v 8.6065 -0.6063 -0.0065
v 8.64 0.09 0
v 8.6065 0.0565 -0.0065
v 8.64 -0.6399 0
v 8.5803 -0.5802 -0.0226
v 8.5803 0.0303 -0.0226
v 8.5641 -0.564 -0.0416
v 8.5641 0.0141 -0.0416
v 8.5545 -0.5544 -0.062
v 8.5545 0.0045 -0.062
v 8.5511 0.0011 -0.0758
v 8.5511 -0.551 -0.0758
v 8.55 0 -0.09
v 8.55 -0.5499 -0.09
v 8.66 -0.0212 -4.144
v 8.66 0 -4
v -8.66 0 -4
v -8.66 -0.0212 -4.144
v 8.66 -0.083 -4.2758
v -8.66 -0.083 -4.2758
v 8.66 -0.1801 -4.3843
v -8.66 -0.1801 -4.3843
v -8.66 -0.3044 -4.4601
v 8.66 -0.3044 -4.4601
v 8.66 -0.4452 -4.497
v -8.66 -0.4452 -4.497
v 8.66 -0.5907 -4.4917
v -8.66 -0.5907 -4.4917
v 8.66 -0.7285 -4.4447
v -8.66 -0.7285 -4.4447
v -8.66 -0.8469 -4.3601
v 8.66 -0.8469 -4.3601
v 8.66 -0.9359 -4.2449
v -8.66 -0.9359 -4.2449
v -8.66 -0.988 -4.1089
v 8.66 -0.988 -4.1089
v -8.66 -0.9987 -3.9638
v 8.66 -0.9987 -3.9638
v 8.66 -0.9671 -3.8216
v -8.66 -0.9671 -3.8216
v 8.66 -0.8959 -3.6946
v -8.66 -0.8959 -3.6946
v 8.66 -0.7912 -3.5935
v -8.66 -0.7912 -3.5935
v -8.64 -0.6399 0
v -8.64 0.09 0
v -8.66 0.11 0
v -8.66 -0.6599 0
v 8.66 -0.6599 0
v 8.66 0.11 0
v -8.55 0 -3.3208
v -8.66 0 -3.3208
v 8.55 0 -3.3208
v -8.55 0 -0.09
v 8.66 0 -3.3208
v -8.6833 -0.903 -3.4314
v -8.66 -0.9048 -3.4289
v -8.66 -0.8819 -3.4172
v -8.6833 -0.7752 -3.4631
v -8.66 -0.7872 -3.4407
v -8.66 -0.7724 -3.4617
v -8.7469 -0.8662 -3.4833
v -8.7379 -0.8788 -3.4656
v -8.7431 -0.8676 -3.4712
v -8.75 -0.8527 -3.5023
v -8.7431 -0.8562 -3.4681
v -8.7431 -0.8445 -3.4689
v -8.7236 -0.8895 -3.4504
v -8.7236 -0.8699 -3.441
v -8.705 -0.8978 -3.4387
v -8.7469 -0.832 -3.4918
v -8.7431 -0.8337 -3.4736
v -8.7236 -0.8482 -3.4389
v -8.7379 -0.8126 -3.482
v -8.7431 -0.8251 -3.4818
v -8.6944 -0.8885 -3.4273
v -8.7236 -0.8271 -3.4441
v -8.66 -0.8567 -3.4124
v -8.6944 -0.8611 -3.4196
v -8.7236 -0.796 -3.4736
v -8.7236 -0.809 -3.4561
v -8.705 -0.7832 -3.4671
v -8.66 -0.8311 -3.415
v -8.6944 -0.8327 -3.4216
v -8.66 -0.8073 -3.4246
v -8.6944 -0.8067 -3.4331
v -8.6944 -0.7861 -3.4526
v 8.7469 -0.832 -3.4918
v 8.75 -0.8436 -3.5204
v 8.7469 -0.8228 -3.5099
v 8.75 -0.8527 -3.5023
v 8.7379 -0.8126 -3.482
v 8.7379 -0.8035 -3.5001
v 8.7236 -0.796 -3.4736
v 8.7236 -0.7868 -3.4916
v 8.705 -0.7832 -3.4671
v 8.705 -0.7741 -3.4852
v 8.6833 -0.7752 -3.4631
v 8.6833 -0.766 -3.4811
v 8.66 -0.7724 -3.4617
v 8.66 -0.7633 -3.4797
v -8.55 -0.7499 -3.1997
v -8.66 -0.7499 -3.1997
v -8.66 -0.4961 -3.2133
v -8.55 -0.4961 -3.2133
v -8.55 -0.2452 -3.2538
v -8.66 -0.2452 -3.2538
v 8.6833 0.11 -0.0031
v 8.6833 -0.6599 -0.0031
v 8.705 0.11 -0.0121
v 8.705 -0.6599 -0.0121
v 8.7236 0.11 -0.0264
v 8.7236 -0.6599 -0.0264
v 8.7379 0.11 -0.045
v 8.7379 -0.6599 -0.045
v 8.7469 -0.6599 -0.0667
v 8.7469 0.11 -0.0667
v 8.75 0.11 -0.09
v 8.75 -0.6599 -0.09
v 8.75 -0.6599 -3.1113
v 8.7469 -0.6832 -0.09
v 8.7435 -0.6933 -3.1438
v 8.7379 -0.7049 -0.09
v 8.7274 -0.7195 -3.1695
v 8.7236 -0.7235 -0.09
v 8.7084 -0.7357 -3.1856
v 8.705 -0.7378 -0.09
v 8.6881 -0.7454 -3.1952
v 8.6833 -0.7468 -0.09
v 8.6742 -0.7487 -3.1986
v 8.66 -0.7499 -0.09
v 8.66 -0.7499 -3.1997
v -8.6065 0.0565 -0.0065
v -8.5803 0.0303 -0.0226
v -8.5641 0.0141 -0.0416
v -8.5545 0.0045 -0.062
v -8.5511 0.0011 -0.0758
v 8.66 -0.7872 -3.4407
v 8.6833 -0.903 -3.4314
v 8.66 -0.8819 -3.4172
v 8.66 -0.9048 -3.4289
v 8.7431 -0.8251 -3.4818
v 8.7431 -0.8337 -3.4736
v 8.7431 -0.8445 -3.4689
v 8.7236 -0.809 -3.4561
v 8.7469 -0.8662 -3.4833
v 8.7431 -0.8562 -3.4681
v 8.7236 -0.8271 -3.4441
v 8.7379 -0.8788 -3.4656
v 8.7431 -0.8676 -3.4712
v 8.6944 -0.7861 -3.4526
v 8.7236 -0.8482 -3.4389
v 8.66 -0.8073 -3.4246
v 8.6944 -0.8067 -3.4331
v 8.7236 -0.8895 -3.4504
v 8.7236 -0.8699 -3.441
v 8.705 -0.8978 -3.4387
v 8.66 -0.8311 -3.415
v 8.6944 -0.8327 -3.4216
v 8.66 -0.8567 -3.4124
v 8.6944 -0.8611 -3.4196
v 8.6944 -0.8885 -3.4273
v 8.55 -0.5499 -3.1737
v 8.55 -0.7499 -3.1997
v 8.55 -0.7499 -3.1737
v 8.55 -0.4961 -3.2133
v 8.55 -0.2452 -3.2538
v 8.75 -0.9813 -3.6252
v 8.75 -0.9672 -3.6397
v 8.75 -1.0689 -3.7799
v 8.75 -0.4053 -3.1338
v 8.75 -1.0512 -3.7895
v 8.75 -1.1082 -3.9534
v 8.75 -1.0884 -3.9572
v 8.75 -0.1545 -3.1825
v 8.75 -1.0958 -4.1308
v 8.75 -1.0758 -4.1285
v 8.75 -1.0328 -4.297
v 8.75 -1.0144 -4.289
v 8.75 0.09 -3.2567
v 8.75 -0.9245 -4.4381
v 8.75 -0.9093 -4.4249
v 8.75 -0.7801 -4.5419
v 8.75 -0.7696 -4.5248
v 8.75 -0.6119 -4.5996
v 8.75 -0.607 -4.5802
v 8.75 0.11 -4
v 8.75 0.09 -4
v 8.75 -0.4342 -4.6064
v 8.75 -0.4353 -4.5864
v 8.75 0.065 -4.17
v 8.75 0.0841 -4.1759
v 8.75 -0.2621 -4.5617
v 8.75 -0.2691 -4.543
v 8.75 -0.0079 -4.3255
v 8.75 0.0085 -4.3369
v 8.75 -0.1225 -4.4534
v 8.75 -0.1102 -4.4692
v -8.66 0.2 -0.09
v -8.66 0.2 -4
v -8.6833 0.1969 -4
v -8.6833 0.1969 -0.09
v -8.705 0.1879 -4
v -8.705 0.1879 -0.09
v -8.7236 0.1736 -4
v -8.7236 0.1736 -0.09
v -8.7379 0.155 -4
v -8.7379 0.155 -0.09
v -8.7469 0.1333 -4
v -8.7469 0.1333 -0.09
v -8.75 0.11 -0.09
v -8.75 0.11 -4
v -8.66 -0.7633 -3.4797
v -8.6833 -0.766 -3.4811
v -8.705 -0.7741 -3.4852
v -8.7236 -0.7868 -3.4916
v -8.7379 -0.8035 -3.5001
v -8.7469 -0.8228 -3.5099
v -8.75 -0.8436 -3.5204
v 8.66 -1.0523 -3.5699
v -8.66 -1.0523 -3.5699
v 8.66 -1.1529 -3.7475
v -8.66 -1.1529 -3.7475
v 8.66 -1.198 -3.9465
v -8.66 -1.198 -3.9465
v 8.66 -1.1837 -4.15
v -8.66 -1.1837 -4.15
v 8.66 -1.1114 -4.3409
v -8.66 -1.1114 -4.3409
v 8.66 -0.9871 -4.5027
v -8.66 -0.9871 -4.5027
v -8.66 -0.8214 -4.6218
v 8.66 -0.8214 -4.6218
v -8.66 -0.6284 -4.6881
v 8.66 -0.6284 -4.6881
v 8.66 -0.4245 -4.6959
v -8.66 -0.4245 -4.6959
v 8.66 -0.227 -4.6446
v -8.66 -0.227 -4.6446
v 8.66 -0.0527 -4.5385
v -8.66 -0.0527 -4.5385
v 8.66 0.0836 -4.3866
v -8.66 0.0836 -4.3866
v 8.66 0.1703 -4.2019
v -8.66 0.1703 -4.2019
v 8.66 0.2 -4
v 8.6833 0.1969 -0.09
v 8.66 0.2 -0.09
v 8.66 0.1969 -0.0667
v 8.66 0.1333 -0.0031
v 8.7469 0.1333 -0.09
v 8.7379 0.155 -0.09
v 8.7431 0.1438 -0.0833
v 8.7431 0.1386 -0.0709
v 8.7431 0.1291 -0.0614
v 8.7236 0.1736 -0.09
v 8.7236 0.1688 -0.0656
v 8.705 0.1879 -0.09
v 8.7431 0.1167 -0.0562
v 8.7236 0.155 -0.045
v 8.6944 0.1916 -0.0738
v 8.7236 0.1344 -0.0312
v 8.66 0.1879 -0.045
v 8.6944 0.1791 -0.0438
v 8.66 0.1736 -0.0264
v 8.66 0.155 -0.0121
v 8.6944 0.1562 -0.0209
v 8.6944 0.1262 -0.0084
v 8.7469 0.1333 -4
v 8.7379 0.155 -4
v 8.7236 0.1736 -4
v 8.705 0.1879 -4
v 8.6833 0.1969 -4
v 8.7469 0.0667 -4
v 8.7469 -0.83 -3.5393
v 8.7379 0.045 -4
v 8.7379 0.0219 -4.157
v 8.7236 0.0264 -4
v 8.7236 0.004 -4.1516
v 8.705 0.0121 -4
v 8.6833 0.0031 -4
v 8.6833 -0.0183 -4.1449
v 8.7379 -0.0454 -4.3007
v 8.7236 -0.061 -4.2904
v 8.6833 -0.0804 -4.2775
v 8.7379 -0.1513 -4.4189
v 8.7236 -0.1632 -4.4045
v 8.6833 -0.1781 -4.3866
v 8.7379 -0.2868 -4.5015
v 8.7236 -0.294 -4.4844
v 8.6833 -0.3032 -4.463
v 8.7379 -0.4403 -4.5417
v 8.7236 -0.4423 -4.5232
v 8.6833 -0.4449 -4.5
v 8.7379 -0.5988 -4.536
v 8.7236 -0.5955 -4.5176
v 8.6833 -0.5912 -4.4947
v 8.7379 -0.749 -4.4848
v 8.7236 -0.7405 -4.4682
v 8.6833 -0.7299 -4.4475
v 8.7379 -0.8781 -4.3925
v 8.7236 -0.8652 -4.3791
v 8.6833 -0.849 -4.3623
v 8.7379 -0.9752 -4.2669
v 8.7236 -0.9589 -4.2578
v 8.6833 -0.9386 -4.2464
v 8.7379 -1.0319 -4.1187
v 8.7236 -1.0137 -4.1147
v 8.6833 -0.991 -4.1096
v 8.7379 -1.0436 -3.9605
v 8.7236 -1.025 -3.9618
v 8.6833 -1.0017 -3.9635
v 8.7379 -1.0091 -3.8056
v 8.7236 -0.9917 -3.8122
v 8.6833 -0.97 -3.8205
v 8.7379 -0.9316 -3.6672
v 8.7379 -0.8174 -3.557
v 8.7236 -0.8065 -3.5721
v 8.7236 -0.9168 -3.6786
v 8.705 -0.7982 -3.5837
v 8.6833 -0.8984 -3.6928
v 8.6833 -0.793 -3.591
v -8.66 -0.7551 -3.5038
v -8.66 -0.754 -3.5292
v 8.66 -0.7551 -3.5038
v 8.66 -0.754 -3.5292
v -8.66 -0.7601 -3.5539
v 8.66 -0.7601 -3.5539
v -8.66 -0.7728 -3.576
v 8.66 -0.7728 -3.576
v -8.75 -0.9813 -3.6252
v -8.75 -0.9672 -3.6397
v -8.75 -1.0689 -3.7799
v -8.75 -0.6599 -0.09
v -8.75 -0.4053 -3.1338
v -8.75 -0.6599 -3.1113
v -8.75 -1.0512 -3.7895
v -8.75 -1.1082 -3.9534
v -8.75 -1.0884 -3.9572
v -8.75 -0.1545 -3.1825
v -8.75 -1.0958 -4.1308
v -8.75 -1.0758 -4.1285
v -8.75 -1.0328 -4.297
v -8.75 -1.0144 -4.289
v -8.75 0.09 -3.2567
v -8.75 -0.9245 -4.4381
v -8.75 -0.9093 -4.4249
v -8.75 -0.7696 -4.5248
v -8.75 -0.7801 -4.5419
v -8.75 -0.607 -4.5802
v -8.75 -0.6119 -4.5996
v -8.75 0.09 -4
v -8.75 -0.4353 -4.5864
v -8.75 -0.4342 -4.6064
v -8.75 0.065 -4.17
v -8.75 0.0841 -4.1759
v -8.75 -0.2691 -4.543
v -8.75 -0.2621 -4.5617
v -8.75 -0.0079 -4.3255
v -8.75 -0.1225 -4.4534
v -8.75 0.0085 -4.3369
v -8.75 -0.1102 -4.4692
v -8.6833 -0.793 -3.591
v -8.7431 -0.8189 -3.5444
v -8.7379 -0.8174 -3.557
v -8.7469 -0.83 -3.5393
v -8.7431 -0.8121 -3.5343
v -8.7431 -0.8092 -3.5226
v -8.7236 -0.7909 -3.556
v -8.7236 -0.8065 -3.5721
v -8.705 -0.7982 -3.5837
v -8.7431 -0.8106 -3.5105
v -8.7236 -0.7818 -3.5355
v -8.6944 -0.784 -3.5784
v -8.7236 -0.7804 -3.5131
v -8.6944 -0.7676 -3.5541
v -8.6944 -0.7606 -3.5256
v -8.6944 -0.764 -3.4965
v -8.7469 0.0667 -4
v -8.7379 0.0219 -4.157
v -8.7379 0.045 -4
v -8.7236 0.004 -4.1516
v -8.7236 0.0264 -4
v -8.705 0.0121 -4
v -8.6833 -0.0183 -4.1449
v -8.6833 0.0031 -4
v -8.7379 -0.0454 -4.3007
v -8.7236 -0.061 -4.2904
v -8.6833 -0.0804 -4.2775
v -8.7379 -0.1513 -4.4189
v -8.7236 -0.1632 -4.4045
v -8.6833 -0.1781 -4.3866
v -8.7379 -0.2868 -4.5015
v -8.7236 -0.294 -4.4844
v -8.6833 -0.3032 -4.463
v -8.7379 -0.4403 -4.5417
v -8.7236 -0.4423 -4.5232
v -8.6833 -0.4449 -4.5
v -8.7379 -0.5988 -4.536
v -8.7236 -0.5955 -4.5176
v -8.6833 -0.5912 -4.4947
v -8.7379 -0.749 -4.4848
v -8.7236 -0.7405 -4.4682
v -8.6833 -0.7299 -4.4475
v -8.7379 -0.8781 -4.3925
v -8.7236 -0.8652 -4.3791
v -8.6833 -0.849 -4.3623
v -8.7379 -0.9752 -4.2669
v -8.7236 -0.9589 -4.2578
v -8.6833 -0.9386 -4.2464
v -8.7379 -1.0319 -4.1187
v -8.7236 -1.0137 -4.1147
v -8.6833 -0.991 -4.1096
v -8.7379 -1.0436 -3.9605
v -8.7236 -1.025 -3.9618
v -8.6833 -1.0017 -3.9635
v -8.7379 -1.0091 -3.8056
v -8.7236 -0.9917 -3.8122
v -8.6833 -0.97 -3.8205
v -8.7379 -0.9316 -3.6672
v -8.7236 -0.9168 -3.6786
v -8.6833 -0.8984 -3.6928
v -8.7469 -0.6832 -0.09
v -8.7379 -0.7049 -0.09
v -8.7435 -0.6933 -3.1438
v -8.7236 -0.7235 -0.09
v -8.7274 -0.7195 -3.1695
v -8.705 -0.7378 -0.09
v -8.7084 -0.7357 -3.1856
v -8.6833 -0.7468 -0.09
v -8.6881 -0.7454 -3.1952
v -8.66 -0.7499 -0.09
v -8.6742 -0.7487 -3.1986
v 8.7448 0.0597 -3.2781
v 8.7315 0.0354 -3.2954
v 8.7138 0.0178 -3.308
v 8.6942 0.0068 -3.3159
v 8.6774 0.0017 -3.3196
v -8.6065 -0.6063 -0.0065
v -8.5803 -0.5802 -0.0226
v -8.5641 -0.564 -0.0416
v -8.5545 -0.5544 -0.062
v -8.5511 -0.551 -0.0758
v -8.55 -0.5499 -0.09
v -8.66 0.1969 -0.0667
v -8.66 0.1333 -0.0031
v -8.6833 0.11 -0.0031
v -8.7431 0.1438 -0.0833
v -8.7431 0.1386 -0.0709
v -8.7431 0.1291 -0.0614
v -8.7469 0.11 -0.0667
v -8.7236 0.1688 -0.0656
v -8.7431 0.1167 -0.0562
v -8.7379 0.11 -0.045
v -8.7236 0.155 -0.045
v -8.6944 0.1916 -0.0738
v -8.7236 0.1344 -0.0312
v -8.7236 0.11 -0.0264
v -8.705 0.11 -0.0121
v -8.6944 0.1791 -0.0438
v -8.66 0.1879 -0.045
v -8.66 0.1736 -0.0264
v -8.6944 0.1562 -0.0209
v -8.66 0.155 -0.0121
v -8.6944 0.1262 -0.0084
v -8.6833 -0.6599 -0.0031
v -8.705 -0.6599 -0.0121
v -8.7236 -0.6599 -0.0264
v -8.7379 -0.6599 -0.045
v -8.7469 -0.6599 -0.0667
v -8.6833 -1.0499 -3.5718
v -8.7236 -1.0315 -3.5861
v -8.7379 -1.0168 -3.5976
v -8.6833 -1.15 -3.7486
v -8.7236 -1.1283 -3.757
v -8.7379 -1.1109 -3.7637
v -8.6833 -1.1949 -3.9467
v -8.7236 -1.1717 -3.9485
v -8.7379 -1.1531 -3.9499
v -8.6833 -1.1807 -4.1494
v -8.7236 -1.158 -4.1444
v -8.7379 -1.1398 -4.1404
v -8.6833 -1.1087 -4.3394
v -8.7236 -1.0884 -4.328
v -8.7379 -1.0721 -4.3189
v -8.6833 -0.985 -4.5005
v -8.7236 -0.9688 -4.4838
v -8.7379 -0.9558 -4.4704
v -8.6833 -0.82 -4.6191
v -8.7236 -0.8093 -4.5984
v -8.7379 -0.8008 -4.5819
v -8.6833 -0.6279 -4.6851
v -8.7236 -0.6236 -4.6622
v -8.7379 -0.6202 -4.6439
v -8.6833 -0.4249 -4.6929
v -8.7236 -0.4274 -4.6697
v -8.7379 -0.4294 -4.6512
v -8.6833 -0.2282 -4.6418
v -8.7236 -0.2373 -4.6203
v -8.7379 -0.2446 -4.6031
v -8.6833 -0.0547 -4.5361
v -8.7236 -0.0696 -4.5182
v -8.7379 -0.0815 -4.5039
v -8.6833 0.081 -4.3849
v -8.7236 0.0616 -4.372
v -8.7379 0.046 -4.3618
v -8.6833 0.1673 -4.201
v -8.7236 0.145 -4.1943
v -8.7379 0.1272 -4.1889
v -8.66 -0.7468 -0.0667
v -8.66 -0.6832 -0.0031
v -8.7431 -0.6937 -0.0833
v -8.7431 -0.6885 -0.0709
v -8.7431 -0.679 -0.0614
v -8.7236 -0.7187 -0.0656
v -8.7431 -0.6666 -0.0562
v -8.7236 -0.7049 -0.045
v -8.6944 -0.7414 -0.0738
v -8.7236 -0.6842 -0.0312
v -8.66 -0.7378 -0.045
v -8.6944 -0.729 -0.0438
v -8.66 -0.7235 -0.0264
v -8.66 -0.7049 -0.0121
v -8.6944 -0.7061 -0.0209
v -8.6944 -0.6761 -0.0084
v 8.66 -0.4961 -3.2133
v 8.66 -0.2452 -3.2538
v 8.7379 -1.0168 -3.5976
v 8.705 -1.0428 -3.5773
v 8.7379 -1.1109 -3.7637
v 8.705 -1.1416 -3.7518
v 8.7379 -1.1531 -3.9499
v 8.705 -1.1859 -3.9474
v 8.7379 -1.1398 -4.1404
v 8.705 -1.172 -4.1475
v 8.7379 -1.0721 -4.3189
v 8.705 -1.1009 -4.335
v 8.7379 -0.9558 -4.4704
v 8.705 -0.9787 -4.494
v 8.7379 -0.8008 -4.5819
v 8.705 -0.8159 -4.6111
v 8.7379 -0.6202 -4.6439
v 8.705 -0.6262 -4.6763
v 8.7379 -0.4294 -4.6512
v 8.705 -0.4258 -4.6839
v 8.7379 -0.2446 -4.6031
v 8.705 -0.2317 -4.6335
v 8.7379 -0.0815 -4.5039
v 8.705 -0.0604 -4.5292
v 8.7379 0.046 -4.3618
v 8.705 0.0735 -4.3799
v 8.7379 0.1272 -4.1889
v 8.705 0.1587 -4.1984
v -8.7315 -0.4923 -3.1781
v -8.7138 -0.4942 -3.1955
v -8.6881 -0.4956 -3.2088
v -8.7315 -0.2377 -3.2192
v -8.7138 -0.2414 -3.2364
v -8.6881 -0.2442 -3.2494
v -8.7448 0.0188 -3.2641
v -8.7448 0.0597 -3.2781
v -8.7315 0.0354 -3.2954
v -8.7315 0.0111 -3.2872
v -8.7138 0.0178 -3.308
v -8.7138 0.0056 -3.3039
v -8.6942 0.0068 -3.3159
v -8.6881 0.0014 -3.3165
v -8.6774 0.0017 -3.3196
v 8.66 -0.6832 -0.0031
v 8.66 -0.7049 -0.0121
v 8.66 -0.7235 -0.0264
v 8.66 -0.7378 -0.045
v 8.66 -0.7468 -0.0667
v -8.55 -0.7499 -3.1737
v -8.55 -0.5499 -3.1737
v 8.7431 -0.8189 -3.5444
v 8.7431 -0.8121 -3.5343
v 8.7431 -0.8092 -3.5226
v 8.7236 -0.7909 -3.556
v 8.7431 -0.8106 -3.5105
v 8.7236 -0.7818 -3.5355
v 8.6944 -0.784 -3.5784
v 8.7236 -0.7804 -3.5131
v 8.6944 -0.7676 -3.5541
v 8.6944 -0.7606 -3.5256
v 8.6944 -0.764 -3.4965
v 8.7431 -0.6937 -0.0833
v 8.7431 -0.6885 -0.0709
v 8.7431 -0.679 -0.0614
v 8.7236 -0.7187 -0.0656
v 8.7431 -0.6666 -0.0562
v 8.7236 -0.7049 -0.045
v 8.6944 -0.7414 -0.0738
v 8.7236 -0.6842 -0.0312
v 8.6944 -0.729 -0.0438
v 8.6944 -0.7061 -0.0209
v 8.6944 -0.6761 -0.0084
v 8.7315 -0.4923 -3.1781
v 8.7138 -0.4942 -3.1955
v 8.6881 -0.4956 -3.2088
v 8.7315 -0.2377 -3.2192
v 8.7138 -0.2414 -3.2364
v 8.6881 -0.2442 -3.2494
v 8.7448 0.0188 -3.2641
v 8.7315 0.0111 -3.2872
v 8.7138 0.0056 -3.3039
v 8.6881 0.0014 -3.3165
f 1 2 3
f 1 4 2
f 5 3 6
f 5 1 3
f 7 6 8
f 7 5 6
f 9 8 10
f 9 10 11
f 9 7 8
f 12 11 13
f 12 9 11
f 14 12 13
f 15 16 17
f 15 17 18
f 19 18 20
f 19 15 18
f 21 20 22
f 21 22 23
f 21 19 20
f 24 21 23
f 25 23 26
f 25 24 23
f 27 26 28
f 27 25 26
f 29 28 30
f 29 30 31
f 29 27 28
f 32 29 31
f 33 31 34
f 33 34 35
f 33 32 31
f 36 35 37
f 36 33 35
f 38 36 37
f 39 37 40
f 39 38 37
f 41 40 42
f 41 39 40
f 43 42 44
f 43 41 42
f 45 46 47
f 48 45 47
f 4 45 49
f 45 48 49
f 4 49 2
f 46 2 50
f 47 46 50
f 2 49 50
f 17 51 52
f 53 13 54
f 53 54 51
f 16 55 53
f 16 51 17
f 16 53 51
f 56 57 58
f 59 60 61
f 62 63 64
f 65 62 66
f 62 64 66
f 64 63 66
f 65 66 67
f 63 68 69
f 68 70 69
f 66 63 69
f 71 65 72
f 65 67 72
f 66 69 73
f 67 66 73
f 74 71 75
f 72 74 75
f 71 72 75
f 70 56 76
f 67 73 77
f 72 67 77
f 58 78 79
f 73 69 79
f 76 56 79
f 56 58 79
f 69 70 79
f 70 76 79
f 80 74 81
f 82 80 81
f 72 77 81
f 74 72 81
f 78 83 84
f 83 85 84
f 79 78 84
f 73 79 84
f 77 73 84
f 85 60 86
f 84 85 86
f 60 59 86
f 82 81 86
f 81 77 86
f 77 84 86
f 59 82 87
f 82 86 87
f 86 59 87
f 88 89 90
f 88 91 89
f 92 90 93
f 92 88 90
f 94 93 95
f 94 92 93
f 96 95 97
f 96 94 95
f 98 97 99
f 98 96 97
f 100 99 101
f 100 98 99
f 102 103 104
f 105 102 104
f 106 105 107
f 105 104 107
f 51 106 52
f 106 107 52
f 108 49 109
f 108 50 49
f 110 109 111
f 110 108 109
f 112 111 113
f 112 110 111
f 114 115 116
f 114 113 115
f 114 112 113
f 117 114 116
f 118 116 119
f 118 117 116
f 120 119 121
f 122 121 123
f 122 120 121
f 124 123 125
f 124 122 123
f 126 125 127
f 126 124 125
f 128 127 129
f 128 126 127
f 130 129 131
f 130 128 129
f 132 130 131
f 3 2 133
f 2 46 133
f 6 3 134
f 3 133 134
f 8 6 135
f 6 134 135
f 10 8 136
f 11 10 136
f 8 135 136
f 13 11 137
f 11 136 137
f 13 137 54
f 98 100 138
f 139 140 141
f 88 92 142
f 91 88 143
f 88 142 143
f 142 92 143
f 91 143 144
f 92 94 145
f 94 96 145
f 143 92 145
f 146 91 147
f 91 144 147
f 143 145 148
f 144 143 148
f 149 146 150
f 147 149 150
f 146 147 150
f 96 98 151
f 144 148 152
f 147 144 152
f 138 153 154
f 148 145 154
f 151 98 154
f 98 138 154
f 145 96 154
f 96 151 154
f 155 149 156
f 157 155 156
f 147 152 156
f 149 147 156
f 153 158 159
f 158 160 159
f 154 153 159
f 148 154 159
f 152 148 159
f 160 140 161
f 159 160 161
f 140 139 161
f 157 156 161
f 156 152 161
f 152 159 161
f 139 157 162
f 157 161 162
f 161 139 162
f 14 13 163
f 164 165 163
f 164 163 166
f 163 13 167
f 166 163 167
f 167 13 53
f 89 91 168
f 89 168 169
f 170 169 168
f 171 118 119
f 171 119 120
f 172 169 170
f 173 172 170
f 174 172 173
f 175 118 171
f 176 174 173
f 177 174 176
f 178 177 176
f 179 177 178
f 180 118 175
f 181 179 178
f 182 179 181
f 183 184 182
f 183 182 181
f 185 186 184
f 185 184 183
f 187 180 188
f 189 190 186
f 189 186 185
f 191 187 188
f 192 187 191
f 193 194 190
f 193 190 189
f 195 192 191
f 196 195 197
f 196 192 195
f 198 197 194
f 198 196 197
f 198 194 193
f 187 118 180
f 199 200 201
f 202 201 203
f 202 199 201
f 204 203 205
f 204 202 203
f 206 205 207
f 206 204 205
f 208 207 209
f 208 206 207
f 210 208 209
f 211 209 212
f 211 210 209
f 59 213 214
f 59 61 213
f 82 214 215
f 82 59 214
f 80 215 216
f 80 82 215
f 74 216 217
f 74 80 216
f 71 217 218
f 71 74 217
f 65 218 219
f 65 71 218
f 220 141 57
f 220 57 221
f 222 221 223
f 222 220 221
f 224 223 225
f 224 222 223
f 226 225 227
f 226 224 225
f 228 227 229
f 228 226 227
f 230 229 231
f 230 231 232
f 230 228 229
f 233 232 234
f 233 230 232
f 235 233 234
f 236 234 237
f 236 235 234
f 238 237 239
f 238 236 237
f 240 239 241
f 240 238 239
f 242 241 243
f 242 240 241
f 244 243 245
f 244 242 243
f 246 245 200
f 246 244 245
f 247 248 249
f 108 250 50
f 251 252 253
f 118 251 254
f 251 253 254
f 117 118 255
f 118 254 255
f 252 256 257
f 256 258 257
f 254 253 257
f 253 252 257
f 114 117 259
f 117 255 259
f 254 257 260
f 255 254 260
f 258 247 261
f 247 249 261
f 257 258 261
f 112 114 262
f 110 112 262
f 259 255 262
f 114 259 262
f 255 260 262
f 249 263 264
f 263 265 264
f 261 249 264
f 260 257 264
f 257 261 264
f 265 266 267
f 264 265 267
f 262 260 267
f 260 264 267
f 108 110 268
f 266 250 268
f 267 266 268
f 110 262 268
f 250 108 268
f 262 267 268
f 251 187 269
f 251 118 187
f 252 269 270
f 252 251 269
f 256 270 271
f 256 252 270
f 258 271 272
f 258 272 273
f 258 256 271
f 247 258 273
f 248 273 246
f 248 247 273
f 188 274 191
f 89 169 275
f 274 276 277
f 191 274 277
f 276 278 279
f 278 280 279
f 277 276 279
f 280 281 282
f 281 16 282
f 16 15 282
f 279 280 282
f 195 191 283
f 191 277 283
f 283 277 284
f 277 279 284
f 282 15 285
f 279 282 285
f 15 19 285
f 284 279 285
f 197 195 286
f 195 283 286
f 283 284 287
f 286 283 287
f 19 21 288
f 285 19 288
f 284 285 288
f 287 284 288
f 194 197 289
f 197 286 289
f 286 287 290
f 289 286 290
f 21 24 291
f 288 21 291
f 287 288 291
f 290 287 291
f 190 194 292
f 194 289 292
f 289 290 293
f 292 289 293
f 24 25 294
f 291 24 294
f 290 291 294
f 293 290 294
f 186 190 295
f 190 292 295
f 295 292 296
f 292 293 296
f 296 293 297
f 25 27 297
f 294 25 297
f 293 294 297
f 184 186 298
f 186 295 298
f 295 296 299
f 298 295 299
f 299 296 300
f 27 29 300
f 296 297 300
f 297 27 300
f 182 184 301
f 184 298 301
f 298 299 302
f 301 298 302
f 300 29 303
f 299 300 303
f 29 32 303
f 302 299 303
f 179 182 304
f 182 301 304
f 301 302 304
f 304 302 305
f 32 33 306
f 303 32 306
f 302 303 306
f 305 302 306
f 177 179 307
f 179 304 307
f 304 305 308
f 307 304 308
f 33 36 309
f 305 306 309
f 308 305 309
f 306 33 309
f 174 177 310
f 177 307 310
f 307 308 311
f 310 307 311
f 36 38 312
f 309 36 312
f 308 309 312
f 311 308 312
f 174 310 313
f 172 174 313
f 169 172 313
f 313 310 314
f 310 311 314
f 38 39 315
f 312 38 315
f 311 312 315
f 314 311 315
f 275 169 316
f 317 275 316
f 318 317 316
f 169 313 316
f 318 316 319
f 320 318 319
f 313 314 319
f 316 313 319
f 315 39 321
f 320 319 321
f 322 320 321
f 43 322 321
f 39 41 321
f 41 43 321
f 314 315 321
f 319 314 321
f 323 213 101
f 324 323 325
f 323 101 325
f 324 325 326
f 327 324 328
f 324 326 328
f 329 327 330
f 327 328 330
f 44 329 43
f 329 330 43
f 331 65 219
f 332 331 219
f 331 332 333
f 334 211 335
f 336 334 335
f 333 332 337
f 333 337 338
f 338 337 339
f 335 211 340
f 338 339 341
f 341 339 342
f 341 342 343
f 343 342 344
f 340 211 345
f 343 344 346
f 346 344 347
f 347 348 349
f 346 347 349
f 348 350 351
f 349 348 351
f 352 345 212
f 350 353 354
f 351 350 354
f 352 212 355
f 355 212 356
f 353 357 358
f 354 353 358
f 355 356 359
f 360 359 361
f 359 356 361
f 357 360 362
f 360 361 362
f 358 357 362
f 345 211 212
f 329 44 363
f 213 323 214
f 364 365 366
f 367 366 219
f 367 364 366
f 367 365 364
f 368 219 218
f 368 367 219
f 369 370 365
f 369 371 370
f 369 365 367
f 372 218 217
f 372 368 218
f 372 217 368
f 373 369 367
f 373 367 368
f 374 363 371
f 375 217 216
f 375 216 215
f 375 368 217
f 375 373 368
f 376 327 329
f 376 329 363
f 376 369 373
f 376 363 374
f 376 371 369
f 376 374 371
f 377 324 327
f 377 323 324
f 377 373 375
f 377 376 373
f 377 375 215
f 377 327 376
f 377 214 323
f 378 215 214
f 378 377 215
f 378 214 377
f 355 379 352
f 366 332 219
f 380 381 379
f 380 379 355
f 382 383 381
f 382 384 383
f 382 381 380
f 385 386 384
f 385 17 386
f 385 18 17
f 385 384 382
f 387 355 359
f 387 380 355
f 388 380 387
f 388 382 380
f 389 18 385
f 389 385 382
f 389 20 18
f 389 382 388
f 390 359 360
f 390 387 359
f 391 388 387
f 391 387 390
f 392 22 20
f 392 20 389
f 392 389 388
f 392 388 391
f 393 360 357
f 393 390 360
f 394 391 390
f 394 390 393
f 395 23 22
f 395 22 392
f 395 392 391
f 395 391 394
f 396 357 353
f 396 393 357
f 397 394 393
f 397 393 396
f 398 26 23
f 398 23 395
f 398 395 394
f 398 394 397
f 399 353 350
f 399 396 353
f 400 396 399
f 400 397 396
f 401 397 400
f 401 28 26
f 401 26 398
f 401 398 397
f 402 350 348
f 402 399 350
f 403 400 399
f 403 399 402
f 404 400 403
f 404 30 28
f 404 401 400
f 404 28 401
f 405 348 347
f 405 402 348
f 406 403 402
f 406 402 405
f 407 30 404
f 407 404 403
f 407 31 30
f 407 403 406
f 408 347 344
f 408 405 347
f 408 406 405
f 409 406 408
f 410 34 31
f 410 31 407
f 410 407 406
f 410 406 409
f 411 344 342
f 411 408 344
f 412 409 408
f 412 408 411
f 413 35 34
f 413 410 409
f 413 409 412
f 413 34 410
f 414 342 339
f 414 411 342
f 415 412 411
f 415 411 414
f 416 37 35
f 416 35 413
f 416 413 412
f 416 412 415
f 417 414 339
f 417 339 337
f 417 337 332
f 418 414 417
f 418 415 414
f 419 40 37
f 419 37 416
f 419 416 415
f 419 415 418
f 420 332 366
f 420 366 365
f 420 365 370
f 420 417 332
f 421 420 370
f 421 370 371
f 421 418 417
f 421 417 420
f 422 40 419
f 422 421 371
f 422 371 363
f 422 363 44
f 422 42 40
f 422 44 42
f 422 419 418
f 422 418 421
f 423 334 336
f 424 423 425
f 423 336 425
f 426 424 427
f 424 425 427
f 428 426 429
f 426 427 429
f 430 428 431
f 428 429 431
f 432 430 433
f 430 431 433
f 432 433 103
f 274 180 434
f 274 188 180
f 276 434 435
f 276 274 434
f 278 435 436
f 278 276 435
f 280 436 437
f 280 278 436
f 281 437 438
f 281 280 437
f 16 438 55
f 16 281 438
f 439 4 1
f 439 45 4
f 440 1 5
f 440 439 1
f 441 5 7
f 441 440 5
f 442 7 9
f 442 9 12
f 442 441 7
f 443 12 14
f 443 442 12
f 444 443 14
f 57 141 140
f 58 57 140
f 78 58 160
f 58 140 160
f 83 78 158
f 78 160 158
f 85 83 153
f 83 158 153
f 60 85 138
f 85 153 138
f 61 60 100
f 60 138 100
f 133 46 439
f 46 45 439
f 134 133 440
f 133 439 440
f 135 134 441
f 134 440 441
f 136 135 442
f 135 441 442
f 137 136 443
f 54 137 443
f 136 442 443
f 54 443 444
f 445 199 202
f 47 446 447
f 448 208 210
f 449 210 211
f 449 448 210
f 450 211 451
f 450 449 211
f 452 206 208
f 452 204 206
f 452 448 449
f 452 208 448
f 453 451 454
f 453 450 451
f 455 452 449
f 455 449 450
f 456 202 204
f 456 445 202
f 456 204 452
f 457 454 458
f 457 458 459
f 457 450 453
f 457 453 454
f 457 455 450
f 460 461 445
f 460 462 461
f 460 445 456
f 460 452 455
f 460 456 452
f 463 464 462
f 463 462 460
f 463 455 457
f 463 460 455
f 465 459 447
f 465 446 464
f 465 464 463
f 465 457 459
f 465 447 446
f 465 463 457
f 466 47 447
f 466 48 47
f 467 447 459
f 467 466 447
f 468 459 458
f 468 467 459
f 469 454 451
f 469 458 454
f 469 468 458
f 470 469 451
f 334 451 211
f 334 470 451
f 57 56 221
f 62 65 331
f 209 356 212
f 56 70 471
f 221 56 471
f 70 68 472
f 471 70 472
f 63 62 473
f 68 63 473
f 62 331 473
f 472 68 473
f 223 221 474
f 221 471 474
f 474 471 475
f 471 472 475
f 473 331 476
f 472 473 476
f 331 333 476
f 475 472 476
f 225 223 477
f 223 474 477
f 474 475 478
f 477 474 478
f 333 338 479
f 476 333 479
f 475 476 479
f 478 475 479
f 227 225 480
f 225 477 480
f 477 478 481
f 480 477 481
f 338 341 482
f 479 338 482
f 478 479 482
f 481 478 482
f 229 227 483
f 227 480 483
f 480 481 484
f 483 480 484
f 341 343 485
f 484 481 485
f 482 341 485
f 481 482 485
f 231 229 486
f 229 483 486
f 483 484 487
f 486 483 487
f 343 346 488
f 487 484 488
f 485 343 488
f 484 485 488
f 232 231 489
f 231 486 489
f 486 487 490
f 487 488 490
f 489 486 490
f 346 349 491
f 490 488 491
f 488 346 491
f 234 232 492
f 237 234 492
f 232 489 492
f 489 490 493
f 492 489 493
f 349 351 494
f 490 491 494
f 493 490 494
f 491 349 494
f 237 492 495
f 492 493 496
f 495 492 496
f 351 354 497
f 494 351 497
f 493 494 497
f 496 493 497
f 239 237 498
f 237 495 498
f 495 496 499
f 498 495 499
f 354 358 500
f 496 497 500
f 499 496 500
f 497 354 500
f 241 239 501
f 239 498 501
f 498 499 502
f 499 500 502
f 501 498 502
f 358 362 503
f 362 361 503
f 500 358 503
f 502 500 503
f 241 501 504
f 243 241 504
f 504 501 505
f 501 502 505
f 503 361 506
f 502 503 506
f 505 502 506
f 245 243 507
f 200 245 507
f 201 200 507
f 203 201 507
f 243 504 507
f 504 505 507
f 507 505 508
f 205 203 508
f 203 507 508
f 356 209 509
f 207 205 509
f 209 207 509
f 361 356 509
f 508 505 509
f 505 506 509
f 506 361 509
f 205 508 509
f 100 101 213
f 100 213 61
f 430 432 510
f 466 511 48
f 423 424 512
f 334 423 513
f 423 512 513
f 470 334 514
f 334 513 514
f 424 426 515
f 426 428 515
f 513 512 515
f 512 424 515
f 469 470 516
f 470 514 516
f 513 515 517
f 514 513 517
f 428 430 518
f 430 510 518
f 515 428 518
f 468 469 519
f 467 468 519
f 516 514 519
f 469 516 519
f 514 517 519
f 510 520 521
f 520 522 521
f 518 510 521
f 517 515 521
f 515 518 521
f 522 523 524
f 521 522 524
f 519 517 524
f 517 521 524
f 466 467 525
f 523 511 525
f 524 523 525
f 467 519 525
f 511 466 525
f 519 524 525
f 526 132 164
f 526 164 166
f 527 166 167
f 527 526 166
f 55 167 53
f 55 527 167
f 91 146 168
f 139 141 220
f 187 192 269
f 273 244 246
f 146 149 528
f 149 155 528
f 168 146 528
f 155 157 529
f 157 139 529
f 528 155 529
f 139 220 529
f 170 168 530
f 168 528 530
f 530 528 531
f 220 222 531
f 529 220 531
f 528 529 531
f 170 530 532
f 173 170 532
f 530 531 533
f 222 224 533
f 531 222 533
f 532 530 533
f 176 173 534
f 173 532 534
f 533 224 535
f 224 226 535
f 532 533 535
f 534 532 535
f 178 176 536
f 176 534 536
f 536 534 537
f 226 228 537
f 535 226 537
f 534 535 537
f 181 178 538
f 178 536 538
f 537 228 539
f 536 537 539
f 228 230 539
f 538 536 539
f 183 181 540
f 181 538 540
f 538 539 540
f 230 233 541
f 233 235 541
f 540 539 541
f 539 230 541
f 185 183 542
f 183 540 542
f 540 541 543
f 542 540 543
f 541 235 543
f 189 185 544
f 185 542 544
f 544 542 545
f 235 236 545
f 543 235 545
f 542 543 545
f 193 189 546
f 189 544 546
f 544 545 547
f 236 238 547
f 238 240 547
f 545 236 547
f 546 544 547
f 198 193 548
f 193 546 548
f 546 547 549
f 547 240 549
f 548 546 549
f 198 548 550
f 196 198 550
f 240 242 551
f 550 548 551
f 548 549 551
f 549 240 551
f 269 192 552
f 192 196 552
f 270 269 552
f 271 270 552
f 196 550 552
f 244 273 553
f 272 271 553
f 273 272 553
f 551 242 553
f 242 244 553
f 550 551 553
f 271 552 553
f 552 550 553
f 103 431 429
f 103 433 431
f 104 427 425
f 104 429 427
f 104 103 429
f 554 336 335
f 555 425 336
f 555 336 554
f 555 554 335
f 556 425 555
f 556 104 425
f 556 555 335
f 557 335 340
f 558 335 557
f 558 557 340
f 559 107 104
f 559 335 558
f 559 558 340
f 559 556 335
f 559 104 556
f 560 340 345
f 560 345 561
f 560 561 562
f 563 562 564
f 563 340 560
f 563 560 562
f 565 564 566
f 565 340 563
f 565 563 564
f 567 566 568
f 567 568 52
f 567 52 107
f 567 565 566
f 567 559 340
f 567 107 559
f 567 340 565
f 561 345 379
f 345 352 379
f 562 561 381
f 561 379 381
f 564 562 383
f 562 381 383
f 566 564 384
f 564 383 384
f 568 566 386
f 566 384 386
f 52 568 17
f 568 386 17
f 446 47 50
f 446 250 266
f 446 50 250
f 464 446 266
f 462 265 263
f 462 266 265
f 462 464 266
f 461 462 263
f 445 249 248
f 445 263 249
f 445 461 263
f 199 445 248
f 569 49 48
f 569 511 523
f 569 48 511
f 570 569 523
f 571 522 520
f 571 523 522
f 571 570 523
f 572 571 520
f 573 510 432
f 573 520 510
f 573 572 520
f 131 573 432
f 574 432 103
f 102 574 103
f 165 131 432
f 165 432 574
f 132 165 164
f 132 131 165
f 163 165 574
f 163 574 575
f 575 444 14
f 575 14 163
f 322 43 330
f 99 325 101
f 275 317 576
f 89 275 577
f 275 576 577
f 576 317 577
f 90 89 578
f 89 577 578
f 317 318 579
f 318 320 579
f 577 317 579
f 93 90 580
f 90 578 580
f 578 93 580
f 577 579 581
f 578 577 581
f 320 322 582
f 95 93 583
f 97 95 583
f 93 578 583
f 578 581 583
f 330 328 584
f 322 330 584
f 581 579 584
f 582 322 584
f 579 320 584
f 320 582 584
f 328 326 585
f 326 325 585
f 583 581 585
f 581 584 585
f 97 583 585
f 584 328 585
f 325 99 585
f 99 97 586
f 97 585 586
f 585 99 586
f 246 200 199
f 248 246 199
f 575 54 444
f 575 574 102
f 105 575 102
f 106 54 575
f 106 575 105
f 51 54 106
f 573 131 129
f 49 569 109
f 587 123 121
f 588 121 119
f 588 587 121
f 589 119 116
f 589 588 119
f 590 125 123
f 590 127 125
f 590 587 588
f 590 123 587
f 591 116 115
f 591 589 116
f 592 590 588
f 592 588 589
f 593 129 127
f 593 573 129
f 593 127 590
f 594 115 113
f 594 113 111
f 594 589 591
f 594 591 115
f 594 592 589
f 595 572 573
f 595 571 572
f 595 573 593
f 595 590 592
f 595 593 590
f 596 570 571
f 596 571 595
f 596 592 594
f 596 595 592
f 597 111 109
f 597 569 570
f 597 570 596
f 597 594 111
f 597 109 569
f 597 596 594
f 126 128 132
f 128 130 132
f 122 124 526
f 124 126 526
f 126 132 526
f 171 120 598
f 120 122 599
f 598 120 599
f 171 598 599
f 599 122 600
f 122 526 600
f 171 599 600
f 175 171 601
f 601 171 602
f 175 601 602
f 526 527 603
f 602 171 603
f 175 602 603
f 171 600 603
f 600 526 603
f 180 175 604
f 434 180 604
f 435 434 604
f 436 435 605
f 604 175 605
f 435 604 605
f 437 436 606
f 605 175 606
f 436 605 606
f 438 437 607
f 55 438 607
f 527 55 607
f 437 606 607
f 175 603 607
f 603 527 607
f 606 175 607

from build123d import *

# Parameters (mm, degrees)
BOSS_EXTRUDE1_DEPTH             = 8.75
BOSS_EXTRUDE2_DEPTH             = 0.2
BOSS_EXTRUDE3_REACH             = 12.005
SKETCH4_W                       = 3.173679441
SKETCH4_H                       = 0.2
BOSS_EXTRUDE3_DIRECTION_2_REACH = 12.005
FILLET1_R                       = 0.09


with BuildPart() as part:
    # Sketch2 → Boss-Extrude1 (new, symmetric)
    with BuildSketch(Plane(origin=(0, 0, 0), x_dir=(0, 0, -1), z_dir=(1, 0, 0))):
        with BuildLine():
            Line((0, 0), (4, 0))
            ThreePointArc((4, 0), (4.425963639, -0.761830056), (3.553879666, -0.725780087))
            Line((3.553879666, -0.725780087), (3.375431533, -0.816092122))
            ThreePointArc((3.375431533, -0.816092122), (4.596349095, -0.866562078), (4, 0.2))
            Line((4, 0.2), (0, 0.2))
            Line((0, 0.2), (0, 0))
        make_face()
    extrude(amount=BOSS_EXTRUDE1_DEPTH, both=True)

    # Sketch3 → Boss-Extrude2 (add)
    with BuildSketch(Plane(origin=(8.75, 0, 0), x_dir=(0, 0, -1), z_dir=(1, 0, 0))):
        with BuildLine():
            Line((0, 0), (0, -0.749873542))
            Line((0, -0.749873542), (3.199706895, -0.749873542))
            ThreePointArc((3.199706895, -0.749873542), (3.230171613, -0.370080622), (3.320786706, 0))
            Line((3.320786706, 0), (0, 0))
        make_face()
    boss_extrude2 = extrude(amount=-BOSS_EXTRUDE2_DEPTH)

    # Mirror1: Boss-Extrude2 across plane
    add(boss_extrude2.mirror(Plane(origin=(0, 0, 0), x_dir=(0, 0, 1), z_dir=(1, 0, 0))))

    # Boss-Extrude3: up to this face of the body (flat: up to its plane)
    boss_extrude3_end = Plane(part.part.faces().sort_by_distance((8.55, -0.372613624, -1.620023342))[0])
    # Sketch4 → Boss-Extrude3 (add, up to the picked face)
    with BuildSketch(Plane(origin=(0, 0, 0), x_dir=(0, 0, -1), z_dir=(1, 0, 0)), mode=Mode.PRIVATE) as boss_extrude3_sk1:
        with Locations((1.58683972, -0.649873542)):
            Rectangle(SKETCH4_W, SKETCH4_H)
    boss_extrude3_tool1 = split(extrude(boss_extrude3_sk1.sketch, amount=BOSS_EXTRUDE3_REACH, mode=Mode.PRIVATE), bisect_by=boss_extrude3_end, keep=Keep.BOTH, mode=Mode.PRIVATE)
    add(boss_extrude3_tool1.solids().sort_by(Axis((0, -0.649874, -1.58684), (1, 0, 0)))[0])

    # Boss-Extrude3 direction 2: up to this face of the body (flat: up to its plane)
    boss_extrude3_direction_2_end = Plane(part.part.faces().sort_by_distance((-8.55, -0.372613624, -1.620023342))[0])
    # Sketch4 → Boss-Extrude3 direction 2 (add, up to the picked face)
    with BuildSketch(Plane(origin=(0, 0, 0), x_dir=(0, 0, -1), z_dir=(1, 0, 0)), mode=Mode.PRIVATE) as boss_extrude3_direction_2_sk1:
        with Locations((1.58683972, -0.649873542)):
            Rectangle(SKETCH4_W, SKETCH4_H)
    boss_extrude3_direction_2_tool1 = split(extrude(boss_extrude3_direction_2_sk1.sketch, amount=-BOSS_EXTRUDE3_DIRECTION_2_REACH, mode=Mode.PRIVATE), bisect_by=boss_extrude3_direction_2_end, keep=Keep.BOTH, mode=Mode.PRIVATE)
    add(boss_extrude3_direction_2_tool1.solids().sort_by(Axis((0, -0.649874, -1.58684), (-1, 0, 0)))[0])

    # Fillet1
    fillet1_edges = [part.edges().sort_by_distance(p)[0] for p in [
        (0, 0.2, 0),
        (0, -0.816092122, -3.375431533),
        (0, -0.725780087, -3.553879666),
        (8.75, -0.761830056, -4.425963639),
        (8.75, -0.770936105, -3.4646556),
        (8.75, 0, -3.660393353),
        (0, 0, 0),
        (8.75, -0.866562078, -4.596349095),
        (8.55, -0.274936771, 0),
        (0, -0.749873542, 0),
        (8.75, -0.749873542, -1.599853447),
        (8.75, -0.370080622, -3.230171613),
        (8.75, 0.2, -2),
        (-8.75, 0, -3.660393353),
        (-8.75, -0.749873542, -1.599853447),
        (-8.75, -0.370080622, -3.230171613),
        (-8.55, -0.274936771, 0),
        (0, -0.549873542, 0),
        (8.75, -0.274936771, 0),
        (-8.75, 0.2, -2),
        (-8.75, -0.866562078, -4.596349095),
        (-8.75, -0.770936105, -3.4646556),
        (-8.75, -0.761830056, -4.425963639),
        (-8.75, -0.274936771, 0),
    ]]
    fillet(fillet1_edges, radius=FILLET1_R)


solid = part.part
